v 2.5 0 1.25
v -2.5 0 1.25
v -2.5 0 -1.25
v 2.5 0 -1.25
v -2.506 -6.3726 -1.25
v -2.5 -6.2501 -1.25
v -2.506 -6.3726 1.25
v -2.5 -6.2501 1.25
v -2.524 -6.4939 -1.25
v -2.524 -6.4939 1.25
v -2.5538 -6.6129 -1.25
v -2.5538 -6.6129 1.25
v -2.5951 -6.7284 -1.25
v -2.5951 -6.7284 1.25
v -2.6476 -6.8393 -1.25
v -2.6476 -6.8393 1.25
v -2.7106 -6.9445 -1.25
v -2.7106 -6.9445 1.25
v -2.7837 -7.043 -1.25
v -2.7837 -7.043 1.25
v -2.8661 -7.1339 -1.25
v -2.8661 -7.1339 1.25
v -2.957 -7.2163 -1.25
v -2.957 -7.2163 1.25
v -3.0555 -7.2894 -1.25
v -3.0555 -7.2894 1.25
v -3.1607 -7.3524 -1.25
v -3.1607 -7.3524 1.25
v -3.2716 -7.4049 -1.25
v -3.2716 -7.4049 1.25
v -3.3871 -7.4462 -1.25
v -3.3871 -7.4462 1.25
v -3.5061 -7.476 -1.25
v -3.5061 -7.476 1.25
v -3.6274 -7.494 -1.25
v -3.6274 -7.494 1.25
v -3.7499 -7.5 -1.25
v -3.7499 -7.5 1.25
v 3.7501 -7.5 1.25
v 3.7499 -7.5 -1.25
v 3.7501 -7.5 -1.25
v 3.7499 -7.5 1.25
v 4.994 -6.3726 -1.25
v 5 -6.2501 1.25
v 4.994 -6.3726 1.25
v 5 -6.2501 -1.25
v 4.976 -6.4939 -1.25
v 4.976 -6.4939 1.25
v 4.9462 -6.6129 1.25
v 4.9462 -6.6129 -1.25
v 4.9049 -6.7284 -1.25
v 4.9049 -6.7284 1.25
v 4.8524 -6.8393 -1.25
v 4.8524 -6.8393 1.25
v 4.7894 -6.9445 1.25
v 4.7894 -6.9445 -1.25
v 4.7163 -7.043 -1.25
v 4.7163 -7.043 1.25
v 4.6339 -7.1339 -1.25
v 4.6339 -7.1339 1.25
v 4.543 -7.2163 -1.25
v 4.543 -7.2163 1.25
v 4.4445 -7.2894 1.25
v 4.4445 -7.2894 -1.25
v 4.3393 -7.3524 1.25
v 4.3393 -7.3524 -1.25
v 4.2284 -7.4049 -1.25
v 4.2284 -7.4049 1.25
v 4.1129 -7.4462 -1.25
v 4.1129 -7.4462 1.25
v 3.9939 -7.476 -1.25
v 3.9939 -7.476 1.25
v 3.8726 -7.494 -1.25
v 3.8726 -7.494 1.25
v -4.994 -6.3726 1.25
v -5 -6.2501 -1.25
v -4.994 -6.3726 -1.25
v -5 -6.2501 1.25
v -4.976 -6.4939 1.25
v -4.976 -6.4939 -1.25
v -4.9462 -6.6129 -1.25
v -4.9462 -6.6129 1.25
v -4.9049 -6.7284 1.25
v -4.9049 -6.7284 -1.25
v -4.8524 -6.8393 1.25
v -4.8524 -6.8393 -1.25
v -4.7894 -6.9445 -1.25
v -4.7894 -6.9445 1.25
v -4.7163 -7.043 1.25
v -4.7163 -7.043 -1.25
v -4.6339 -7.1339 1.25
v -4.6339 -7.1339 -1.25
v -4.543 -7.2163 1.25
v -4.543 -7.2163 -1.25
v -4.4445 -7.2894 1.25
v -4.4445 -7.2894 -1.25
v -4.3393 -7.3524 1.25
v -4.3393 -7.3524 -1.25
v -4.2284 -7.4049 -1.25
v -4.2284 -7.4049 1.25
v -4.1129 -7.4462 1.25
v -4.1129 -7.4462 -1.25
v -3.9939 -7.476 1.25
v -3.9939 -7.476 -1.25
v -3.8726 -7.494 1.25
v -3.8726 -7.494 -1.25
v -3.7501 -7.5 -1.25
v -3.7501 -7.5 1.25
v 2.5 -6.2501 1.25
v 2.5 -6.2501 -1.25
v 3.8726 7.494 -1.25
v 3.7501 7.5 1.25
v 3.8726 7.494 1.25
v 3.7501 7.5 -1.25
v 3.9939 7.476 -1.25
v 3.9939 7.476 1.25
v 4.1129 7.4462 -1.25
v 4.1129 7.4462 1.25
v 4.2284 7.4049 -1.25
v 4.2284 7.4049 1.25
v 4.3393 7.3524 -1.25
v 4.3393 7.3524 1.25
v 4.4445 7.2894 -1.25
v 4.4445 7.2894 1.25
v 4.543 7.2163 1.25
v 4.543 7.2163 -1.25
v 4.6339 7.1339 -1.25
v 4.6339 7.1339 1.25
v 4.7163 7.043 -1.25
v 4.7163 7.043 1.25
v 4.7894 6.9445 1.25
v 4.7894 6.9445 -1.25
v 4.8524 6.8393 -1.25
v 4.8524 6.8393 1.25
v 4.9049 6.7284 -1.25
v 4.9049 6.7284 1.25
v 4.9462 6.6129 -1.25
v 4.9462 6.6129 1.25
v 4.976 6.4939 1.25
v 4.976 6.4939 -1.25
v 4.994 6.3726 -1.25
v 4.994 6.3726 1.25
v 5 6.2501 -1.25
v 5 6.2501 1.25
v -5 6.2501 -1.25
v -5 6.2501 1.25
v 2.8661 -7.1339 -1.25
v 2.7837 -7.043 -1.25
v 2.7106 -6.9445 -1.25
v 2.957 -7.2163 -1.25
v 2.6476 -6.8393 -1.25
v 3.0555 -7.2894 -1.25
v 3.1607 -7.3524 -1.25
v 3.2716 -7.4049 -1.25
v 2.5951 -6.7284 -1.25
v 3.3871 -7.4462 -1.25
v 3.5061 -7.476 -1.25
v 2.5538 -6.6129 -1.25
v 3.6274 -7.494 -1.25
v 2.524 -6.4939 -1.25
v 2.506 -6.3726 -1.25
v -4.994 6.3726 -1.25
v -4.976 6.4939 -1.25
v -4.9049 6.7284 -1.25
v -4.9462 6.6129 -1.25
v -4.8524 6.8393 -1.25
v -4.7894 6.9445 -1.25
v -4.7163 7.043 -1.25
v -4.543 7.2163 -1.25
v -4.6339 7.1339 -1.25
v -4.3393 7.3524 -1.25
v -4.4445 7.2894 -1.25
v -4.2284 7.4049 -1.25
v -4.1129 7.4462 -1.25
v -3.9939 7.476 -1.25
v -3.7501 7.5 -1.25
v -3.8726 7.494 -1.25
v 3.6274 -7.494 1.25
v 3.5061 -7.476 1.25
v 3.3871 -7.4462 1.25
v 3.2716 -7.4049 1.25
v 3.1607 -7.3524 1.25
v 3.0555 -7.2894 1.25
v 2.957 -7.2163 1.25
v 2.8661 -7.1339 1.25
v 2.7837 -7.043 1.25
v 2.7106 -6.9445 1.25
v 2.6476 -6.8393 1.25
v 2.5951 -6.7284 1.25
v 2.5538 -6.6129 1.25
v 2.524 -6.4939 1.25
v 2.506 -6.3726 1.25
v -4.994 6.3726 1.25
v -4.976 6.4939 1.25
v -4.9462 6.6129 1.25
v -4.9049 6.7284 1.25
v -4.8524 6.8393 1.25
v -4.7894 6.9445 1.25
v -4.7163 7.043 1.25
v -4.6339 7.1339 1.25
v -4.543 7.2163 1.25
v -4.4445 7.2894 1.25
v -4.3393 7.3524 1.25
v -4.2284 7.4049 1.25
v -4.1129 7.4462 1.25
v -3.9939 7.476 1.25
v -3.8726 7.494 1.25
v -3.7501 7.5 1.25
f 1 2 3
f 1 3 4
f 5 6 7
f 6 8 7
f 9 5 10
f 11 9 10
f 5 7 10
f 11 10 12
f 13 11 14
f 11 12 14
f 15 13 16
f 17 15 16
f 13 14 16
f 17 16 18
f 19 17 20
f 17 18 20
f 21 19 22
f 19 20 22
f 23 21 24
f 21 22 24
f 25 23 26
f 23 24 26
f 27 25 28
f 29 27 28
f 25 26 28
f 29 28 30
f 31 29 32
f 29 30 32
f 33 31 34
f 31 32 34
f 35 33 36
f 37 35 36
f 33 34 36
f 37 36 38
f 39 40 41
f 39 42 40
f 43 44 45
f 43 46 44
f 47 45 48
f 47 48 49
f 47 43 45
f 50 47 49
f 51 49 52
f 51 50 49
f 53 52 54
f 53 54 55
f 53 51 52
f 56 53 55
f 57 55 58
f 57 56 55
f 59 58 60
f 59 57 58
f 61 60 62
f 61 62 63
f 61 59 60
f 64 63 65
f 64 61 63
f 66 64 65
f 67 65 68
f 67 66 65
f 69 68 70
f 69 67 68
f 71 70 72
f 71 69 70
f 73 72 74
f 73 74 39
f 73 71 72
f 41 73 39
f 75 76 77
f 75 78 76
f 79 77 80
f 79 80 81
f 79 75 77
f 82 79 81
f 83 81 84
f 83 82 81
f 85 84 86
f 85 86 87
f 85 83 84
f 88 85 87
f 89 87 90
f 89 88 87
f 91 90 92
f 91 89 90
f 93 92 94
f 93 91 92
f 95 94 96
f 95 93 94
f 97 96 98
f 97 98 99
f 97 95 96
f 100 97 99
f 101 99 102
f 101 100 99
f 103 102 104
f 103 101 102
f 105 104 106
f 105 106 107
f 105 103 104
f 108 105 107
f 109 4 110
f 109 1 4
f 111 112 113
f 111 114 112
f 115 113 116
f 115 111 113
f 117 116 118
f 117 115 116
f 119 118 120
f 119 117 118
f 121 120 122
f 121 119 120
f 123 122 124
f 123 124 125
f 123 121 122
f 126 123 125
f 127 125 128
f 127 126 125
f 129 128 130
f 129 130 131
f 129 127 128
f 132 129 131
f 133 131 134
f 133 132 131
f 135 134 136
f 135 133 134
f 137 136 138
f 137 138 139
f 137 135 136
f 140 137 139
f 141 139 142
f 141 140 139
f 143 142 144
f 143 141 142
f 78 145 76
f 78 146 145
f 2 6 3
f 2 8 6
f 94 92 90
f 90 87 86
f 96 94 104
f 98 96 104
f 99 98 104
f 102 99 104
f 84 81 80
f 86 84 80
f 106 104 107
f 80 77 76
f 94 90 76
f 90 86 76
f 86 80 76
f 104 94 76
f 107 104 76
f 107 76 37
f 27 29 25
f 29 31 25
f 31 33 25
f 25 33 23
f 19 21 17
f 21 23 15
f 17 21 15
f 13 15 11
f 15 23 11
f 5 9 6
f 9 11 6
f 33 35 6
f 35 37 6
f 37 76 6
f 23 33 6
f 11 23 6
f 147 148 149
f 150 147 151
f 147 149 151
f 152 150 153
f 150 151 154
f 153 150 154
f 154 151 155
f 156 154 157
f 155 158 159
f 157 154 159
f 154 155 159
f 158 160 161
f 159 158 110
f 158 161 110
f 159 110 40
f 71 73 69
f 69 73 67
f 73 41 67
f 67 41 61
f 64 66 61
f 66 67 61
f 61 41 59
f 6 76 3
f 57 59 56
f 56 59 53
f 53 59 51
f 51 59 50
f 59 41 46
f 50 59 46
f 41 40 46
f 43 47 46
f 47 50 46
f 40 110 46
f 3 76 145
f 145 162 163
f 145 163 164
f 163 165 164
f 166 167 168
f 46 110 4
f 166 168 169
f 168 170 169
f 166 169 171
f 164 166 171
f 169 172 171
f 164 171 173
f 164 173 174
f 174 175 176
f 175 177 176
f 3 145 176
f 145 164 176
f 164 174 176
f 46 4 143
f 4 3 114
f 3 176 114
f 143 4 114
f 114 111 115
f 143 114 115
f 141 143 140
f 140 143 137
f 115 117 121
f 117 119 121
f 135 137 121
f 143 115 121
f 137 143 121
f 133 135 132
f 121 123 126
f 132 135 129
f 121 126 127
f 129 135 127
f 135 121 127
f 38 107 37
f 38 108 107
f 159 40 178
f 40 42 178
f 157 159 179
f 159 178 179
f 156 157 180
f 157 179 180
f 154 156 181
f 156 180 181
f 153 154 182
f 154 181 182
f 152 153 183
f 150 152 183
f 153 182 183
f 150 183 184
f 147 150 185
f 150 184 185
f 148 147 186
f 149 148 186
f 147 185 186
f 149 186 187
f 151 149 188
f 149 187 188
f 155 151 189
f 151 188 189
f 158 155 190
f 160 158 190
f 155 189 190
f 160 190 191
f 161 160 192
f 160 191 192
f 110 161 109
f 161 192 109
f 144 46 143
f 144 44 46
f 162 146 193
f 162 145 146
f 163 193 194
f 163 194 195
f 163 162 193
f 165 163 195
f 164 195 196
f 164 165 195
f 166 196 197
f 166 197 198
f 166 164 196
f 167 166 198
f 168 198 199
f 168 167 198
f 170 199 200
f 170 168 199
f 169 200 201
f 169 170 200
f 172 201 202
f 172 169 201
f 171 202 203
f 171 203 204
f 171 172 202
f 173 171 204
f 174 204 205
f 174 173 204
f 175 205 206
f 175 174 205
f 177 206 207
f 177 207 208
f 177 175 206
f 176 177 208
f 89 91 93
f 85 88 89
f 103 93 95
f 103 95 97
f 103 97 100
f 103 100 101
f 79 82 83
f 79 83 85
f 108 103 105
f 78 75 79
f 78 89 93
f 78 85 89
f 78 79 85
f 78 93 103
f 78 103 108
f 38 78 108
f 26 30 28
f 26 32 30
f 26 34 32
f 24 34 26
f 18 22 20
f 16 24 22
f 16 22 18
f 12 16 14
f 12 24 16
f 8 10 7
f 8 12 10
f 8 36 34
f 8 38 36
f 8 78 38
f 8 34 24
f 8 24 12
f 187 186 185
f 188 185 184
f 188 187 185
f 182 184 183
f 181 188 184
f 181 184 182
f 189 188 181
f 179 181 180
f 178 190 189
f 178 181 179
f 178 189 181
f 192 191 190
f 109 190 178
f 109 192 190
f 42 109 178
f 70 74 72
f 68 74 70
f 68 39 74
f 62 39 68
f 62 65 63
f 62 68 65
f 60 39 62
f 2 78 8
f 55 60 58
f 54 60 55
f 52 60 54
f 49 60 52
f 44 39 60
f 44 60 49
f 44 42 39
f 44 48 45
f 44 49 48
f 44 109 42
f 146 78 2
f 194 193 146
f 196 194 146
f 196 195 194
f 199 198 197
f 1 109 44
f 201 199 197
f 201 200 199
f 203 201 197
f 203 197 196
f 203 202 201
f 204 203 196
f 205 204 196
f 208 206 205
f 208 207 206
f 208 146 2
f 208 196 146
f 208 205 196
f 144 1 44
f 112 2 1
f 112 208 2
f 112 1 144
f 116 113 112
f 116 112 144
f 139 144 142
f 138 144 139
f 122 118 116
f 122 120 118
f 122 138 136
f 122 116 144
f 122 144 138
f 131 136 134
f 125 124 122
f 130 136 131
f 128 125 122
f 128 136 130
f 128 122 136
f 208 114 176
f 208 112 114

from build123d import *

# Parameters (mm, degrees)
BOSS_EXTRUDE1_DEPTH = 1.25
FILLET1_R           = 1.25


with BuildPart() as part:
    # Sketch1 → Boss-Extrude1 (new, symmetric)
    with BuildSketch(Plane.XY):
        Polygon((-5, 7.5), (-5, -7.5), (-2.5, -7.5), (-2.5, 0), (2.5, 0), (2.5, -7.5), (5, -7.5), (5, 7.5), align=None)
    extrude(amount=BOSS_EXTRUDE1_DEPTH, both=True)

    # Fillet1
    fillet1_edges = [part.edges().sort_by_distance(p)[0] for p in [
        (-2.5, -7.5, 0),
        (-5, -7.5, 0),
        (-5, 7.5, 0),
        (5, 7.5, 0),
        (2.5, -7.5, 0),
        (5, -7.5, 0),
    ]]
    fillet(fillet1_edges, radius=FILLET1_R - 0.0001)  # a hair under: the kernel refuses the full size


solid = part.part
